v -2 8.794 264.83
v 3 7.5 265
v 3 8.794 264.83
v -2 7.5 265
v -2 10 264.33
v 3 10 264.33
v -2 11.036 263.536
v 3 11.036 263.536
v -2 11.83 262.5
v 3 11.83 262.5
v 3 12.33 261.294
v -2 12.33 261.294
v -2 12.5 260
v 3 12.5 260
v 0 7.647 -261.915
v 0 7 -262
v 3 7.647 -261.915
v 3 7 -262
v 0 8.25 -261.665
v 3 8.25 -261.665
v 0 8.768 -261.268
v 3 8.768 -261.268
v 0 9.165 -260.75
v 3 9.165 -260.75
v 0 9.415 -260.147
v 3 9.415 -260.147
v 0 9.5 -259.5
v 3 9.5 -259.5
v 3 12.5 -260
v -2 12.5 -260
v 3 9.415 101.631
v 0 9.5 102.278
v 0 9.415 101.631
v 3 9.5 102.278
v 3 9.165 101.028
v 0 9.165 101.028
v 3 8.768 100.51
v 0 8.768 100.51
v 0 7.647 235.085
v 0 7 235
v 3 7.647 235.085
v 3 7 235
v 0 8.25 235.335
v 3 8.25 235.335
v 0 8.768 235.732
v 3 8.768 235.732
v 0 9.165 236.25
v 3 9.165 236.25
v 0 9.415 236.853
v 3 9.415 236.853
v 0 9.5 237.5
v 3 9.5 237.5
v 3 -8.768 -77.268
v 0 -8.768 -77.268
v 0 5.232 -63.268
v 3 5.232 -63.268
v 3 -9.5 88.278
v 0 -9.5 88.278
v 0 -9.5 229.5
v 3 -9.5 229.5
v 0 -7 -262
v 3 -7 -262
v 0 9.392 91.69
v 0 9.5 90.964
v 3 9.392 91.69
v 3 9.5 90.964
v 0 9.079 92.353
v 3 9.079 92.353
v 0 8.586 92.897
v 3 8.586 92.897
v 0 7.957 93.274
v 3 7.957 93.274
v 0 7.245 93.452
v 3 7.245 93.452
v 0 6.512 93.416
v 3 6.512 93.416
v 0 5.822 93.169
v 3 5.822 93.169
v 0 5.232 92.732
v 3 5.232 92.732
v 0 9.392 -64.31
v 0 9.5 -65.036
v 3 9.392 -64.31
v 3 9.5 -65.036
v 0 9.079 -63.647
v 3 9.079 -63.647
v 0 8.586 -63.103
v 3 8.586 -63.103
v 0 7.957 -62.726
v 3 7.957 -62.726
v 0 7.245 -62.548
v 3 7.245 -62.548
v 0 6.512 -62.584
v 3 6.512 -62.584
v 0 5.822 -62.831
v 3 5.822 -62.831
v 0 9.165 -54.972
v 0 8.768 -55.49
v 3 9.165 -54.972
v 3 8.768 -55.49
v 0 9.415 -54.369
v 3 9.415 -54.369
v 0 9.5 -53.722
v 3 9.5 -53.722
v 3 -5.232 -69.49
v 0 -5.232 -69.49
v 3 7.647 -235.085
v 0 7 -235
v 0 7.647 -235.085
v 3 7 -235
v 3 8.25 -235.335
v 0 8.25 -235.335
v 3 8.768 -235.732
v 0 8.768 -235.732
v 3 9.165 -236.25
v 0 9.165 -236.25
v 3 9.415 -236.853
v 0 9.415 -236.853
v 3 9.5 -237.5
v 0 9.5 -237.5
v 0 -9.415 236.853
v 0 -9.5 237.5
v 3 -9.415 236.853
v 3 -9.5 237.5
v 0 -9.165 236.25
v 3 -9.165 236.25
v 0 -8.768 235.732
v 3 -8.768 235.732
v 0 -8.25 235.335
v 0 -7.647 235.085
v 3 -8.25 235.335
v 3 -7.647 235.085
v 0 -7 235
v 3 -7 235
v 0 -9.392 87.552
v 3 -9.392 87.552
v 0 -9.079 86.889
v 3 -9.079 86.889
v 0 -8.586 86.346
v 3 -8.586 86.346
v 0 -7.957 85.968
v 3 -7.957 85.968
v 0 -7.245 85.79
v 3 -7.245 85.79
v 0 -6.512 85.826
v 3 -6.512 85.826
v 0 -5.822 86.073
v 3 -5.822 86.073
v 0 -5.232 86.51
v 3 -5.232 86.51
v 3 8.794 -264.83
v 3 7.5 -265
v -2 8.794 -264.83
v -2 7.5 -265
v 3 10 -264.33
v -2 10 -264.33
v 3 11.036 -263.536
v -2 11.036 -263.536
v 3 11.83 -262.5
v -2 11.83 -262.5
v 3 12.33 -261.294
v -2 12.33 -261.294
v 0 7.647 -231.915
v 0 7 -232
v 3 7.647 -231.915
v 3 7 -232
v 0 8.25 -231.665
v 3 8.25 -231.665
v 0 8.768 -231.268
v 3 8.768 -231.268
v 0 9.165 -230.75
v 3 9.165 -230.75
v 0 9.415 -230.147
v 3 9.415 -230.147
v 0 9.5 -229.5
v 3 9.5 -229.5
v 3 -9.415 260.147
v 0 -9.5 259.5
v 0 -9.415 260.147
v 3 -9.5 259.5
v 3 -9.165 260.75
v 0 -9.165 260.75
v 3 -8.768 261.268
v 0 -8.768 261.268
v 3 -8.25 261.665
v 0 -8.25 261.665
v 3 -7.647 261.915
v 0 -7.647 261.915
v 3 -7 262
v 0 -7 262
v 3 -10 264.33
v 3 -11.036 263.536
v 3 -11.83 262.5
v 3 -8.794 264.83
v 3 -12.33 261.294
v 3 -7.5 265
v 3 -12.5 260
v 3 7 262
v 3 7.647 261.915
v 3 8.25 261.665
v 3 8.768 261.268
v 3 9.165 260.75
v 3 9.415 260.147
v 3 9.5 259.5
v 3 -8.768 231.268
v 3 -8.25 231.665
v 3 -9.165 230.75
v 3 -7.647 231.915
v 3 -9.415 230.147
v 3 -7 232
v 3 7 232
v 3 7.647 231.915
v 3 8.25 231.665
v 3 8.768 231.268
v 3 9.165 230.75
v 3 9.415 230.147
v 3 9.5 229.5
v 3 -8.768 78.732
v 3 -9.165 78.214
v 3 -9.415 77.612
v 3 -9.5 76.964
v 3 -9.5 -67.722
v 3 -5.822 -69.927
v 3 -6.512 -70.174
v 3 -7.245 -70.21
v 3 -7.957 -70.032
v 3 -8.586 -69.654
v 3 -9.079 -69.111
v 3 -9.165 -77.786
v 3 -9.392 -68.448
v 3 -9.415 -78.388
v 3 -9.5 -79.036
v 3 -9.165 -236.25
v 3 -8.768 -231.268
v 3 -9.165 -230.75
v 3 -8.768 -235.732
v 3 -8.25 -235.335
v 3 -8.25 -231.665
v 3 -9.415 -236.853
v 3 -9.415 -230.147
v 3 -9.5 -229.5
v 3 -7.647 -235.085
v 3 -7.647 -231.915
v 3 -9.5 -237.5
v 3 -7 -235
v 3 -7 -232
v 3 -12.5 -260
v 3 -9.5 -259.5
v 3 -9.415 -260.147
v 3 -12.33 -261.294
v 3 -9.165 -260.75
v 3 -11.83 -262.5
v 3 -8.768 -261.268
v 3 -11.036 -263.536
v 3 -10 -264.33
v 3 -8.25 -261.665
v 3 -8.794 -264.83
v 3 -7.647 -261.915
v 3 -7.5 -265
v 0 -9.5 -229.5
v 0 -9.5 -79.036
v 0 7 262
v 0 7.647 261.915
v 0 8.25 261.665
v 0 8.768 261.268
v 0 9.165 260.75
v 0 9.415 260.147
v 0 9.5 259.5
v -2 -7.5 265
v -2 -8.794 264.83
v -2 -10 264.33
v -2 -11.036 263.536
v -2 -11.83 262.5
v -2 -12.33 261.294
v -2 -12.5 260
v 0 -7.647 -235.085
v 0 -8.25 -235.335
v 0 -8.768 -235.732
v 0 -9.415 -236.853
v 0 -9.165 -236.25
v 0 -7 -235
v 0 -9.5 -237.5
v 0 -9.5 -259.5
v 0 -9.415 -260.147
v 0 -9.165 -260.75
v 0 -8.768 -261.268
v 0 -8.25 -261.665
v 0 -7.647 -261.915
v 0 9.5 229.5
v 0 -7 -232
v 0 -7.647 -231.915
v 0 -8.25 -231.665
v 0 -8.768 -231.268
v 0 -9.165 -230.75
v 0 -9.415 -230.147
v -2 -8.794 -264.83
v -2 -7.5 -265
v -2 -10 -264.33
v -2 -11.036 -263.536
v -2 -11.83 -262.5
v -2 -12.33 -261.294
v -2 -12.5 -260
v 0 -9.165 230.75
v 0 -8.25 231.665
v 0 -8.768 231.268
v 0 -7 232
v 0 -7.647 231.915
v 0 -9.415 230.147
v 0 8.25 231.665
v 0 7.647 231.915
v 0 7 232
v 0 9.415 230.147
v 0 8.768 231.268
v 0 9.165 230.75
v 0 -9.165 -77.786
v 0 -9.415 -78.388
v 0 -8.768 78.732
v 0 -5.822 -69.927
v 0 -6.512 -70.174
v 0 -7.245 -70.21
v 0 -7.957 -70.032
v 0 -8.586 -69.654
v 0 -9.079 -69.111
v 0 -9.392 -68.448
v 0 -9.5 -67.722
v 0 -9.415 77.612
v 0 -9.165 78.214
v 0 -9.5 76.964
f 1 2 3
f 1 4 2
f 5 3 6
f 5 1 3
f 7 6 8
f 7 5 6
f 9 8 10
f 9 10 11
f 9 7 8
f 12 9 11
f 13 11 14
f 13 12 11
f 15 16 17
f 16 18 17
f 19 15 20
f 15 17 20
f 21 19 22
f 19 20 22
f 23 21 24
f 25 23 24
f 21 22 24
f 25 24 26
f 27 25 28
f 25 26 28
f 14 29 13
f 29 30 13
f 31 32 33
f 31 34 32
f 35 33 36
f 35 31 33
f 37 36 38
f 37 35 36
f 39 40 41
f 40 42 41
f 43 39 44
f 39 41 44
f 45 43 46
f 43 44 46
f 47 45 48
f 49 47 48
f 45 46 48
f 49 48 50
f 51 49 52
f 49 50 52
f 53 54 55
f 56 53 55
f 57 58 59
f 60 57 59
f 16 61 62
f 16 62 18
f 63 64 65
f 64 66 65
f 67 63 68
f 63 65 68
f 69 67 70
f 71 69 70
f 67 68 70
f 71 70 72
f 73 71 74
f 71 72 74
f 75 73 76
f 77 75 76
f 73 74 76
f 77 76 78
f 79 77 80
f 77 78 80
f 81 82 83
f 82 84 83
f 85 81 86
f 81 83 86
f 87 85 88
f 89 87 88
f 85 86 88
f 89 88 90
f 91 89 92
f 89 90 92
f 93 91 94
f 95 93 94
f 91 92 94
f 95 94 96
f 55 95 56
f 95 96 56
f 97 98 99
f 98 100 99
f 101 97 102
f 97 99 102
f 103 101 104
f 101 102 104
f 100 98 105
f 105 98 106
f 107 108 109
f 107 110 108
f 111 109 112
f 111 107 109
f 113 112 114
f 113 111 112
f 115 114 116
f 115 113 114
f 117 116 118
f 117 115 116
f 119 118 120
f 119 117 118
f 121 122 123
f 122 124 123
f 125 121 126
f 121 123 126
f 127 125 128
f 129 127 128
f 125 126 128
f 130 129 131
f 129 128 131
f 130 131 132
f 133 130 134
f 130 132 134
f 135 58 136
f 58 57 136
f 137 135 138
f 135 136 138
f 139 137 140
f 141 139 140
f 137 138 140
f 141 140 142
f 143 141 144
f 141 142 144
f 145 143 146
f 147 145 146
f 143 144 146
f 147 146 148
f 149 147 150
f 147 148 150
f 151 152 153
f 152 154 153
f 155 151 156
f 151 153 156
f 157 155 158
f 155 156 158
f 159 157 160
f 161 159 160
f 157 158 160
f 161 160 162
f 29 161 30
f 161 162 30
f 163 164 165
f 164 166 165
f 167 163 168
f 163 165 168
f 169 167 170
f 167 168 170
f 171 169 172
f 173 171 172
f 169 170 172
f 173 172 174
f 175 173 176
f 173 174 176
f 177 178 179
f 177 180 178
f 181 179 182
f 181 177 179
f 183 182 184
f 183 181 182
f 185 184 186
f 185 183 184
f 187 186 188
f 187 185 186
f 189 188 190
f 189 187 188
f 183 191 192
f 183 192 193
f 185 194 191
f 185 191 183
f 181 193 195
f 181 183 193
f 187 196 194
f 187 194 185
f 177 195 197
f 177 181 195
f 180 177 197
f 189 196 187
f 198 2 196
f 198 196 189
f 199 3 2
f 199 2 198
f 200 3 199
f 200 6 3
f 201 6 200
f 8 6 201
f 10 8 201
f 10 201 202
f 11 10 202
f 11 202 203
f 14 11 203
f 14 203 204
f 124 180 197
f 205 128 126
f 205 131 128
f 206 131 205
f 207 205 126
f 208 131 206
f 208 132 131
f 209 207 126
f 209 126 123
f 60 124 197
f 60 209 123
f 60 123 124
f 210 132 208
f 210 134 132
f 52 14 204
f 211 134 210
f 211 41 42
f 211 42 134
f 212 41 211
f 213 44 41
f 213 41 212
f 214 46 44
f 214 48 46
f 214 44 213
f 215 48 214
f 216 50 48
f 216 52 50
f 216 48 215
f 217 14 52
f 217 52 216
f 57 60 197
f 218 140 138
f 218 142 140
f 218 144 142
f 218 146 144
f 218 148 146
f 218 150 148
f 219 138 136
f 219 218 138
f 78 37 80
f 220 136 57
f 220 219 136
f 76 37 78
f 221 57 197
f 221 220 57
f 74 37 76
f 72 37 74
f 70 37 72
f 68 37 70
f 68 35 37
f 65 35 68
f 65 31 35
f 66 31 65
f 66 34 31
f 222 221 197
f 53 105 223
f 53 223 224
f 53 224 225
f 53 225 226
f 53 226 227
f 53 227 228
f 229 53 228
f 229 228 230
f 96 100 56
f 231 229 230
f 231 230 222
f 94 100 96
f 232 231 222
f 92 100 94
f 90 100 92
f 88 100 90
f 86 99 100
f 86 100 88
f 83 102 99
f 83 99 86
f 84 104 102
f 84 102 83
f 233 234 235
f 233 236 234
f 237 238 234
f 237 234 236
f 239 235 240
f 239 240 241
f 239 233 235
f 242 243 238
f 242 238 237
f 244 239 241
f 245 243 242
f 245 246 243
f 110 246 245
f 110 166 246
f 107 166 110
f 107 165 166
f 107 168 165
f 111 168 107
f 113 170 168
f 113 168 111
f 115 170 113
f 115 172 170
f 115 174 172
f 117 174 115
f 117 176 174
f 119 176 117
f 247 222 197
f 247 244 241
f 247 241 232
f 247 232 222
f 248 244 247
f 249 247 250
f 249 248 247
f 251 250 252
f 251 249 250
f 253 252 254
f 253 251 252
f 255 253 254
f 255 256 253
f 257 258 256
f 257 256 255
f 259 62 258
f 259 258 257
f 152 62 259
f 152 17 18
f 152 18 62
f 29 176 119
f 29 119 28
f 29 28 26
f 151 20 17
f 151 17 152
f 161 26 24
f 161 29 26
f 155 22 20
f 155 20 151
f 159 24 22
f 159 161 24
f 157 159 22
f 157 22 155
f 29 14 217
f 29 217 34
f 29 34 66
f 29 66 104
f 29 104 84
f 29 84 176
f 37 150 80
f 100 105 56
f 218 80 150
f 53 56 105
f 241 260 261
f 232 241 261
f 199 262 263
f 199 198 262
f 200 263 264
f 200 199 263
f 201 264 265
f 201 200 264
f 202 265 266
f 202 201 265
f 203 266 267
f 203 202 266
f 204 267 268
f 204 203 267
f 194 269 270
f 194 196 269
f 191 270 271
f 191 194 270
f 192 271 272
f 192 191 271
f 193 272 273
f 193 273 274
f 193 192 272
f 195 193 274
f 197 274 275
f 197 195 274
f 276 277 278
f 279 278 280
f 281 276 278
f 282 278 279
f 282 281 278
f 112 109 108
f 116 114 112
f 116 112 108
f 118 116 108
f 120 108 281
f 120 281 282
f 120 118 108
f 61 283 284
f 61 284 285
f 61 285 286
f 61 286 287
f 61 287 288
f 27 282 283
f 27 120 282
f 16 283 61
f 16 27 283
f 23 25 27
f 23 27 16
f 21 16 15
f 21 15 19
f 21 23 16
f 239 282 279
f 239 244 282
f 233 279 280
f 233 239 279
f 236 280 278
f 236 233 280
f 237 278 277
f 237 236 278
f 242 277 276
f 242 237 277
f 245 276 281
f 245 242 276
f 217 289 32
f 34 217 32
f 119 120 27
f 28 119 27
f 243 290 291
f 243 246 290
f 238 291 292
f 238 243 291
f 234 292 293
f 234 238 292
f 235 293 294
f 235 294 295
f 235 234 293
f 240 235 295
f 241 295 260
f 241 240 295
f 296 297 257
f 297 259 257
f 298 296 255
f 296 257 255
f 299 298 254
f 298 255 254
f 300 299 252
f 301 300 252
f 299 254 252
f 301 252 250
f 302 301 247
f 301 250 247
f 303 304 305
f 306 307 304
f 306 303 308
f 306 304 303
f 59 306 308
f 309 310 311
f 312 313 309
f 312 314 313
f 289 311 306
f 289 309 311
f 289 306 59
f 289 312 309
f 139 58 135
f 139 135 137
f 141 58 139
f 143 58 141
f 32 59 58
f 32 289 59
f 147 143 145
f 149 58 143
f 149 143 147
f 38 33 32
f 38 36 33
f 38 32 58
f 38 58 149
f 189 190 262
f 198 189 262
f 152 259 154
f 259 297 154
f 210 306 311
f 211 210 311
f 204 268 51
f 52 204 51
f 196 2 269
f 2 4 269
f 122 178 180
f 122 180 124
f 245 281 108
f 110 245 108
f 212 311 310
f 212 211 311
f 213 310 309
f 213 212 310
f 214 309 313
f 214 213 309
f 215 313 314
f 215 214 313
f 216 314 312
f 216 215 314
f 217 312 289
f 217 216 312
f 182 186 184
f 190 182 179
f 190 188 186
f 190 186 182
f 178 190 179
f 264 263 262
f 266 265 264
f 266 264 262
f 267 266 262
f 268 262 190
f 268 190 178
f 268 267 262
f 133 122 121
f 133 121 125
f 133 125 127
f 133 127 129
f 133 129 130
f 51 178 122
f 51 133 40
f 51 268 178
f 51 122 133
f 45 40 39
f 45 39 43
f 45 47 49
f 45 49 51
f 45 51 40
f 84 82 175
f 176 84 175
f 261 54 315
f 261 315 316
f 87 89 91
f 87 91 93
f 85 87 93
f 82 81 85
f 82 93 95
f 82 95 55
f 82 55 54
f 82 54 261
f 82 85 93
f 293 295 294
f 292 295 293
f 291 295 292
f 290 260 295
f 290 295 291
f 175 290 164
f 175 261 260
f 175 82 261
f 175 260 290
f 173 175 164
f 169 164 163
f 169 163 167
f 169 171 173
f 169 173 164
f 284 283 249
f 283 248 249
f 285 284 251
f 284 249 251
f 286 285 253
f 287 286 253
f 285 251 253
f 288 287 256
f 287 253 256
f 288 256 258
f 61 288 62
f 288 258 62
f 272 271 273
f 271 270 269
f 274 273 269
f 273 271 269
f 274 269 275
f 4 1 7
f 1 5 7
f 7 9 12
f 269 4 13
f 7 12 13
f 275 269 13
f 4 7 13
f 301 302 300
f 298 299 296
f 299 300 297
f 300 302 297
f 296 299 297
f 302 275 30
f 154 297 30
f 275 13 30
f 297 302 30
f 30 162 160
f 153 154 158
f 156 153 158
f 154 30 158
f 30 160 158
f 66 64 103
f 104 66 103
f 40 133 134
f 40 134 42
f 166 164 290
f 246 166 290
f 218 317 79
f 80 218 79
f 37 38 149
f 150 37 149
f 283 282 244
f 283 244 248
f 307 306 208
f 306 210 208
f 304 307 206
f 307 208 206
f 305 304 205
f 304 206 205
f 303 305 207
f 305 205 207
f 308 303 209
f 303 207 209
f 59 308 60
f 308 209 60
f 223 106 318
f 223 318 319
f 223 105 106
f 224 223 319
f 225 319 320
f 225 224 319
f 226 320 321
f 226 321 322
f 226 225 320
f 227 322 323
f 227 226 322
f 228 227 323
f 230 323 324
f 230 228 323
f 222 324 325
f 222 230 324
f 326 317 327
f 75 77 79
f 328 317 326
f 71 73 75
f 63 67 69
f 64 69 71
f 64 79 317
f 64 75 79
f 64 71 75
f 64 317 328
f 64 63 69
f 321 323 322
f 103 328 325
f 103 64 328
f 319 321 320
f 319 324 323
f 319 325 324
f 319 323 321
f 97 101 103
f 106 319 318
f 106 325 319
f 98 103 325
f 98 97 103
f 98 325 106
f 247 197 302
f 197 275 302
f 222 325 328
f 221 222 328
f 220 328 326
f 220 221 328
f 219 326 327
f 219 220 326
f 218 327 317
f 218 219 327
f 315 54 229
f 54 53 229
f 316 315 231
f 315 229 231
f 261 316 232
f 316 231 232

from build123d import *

# Parameters (mm, degrees)
BOSS_EXTRUDE3_DEPTH = 2
SKETCH1_5_W         = 27
SKETCH1_5_H         = 19
BOSS_EXTRUDE4_DEPTH = 3
FILLET1_R           = 5
FILLET2_R           = 2.5
FILLET3_R           = 2.5


with BuildPart() as part:
    # Sketch1 → Boss-Extrude3 (new body)
    with BuildSketch(Plane(origin=(0, 0, 0), x_dir=(0, 0, -1), z_dir=(1, 0, 0))):
        Polygon((-265, -12.5), (0, -12.5), (265, -12.5), (265, 12.5), (-265, 12.5), align=None)
    extrude(amount=-BOSS_EXTRUDE3_DEPTH)

    # Sketch1<5> → Boss-Extrude4 (add)
    with BuildSketch(Plane(origin=(0, 0, 0), x_dir=(0, 0, -1), z_dir=(1, 0, 0))):
        Polygon((-265, -12.5), (0, -12.5), (265, -12.5), (265, 12.5), (-265, 12.5), align=None)
        with Locations((-248.5, 0)):
            Rectangle(SKETCH1_5_W, SKETCH1_5_H, mode=Mode.SUBTRACT)
        Polygon((-82.242640687, -9.5), (-232, -9.5), (-232, 9.5), (-101.242640687, 9.5), align=None, mode=Mode.SUBTRACT)
        Polygon((0, -9.5), (-78, -9.5), (-97, 9.5), (54.757359313, 9.5), (73.757359313, -9.5), align=None, mode=Mode.SUBTRACT)
        Polygon((232, -9.5), (78, -9.5), (59, 9.5), (232, 9.5), align=None, mode=Mode.SUBTRACT)
        with Locations((248.5, 0)):
            Rectangle(SKETCH1_5_W, SKETCH1_5_H, mode=Mode.SUBTRACT)
    extrude(amount=BOSS_EXTRUDE4_DEPTH)

    # Fillet1
    fillet1_edges = [part.edges().sort_by_distance(p)[0] for p in [
        (0.5, 12.5, -265),
        (0.5, -12.5, -265),
        (0.5, 12.5, 265),
        (0.5, -12.5, 265),
    ]]
    fillet(fillet1_edges, radius=FILLET1_R)

    # Fillet2
    fillet2_edges = [part.edges().sort_by_distance(p)[0] for p in [
        (1.5, -9.5, -262),
        (1.5, 9.5, -262),
        (1.5, -9.5, 262),
        (1.5, 9.5, 262),
    ]]
    fillet(fillet2_edges, radius=FILLET2_R)

    # Fillet3
    fillet3_edges = [part.edges().sort_by_distance(p)[0] for p in [
        (1.5, -9.5, -235),
        (1.5, 9.5, -235),
        (1.5, 9.5, -232),
        (1.5, -9.5, -232),
        (1.5, 9.5, -59),
        (1.5, -9.5, -78),
        (1.5, -9.5, -73.757359313),
        (1.5, 9.5, -54.757359313),
        (1.5, 9.5, 97),
        (1.5, -9.5, 78),
        (1.5, -9.5, 82.242640687),
        (1.5, 9.5, 101.242640687),
        (1.5, -9.5, 232),
        (1.5, 9.5, 232),
        (1.5, -9.5, 235),
        (1.5, 9.5, 235),
    ]]
    fillet(fillet3_edges, radius=FILLET3_R)


solid = part.part
